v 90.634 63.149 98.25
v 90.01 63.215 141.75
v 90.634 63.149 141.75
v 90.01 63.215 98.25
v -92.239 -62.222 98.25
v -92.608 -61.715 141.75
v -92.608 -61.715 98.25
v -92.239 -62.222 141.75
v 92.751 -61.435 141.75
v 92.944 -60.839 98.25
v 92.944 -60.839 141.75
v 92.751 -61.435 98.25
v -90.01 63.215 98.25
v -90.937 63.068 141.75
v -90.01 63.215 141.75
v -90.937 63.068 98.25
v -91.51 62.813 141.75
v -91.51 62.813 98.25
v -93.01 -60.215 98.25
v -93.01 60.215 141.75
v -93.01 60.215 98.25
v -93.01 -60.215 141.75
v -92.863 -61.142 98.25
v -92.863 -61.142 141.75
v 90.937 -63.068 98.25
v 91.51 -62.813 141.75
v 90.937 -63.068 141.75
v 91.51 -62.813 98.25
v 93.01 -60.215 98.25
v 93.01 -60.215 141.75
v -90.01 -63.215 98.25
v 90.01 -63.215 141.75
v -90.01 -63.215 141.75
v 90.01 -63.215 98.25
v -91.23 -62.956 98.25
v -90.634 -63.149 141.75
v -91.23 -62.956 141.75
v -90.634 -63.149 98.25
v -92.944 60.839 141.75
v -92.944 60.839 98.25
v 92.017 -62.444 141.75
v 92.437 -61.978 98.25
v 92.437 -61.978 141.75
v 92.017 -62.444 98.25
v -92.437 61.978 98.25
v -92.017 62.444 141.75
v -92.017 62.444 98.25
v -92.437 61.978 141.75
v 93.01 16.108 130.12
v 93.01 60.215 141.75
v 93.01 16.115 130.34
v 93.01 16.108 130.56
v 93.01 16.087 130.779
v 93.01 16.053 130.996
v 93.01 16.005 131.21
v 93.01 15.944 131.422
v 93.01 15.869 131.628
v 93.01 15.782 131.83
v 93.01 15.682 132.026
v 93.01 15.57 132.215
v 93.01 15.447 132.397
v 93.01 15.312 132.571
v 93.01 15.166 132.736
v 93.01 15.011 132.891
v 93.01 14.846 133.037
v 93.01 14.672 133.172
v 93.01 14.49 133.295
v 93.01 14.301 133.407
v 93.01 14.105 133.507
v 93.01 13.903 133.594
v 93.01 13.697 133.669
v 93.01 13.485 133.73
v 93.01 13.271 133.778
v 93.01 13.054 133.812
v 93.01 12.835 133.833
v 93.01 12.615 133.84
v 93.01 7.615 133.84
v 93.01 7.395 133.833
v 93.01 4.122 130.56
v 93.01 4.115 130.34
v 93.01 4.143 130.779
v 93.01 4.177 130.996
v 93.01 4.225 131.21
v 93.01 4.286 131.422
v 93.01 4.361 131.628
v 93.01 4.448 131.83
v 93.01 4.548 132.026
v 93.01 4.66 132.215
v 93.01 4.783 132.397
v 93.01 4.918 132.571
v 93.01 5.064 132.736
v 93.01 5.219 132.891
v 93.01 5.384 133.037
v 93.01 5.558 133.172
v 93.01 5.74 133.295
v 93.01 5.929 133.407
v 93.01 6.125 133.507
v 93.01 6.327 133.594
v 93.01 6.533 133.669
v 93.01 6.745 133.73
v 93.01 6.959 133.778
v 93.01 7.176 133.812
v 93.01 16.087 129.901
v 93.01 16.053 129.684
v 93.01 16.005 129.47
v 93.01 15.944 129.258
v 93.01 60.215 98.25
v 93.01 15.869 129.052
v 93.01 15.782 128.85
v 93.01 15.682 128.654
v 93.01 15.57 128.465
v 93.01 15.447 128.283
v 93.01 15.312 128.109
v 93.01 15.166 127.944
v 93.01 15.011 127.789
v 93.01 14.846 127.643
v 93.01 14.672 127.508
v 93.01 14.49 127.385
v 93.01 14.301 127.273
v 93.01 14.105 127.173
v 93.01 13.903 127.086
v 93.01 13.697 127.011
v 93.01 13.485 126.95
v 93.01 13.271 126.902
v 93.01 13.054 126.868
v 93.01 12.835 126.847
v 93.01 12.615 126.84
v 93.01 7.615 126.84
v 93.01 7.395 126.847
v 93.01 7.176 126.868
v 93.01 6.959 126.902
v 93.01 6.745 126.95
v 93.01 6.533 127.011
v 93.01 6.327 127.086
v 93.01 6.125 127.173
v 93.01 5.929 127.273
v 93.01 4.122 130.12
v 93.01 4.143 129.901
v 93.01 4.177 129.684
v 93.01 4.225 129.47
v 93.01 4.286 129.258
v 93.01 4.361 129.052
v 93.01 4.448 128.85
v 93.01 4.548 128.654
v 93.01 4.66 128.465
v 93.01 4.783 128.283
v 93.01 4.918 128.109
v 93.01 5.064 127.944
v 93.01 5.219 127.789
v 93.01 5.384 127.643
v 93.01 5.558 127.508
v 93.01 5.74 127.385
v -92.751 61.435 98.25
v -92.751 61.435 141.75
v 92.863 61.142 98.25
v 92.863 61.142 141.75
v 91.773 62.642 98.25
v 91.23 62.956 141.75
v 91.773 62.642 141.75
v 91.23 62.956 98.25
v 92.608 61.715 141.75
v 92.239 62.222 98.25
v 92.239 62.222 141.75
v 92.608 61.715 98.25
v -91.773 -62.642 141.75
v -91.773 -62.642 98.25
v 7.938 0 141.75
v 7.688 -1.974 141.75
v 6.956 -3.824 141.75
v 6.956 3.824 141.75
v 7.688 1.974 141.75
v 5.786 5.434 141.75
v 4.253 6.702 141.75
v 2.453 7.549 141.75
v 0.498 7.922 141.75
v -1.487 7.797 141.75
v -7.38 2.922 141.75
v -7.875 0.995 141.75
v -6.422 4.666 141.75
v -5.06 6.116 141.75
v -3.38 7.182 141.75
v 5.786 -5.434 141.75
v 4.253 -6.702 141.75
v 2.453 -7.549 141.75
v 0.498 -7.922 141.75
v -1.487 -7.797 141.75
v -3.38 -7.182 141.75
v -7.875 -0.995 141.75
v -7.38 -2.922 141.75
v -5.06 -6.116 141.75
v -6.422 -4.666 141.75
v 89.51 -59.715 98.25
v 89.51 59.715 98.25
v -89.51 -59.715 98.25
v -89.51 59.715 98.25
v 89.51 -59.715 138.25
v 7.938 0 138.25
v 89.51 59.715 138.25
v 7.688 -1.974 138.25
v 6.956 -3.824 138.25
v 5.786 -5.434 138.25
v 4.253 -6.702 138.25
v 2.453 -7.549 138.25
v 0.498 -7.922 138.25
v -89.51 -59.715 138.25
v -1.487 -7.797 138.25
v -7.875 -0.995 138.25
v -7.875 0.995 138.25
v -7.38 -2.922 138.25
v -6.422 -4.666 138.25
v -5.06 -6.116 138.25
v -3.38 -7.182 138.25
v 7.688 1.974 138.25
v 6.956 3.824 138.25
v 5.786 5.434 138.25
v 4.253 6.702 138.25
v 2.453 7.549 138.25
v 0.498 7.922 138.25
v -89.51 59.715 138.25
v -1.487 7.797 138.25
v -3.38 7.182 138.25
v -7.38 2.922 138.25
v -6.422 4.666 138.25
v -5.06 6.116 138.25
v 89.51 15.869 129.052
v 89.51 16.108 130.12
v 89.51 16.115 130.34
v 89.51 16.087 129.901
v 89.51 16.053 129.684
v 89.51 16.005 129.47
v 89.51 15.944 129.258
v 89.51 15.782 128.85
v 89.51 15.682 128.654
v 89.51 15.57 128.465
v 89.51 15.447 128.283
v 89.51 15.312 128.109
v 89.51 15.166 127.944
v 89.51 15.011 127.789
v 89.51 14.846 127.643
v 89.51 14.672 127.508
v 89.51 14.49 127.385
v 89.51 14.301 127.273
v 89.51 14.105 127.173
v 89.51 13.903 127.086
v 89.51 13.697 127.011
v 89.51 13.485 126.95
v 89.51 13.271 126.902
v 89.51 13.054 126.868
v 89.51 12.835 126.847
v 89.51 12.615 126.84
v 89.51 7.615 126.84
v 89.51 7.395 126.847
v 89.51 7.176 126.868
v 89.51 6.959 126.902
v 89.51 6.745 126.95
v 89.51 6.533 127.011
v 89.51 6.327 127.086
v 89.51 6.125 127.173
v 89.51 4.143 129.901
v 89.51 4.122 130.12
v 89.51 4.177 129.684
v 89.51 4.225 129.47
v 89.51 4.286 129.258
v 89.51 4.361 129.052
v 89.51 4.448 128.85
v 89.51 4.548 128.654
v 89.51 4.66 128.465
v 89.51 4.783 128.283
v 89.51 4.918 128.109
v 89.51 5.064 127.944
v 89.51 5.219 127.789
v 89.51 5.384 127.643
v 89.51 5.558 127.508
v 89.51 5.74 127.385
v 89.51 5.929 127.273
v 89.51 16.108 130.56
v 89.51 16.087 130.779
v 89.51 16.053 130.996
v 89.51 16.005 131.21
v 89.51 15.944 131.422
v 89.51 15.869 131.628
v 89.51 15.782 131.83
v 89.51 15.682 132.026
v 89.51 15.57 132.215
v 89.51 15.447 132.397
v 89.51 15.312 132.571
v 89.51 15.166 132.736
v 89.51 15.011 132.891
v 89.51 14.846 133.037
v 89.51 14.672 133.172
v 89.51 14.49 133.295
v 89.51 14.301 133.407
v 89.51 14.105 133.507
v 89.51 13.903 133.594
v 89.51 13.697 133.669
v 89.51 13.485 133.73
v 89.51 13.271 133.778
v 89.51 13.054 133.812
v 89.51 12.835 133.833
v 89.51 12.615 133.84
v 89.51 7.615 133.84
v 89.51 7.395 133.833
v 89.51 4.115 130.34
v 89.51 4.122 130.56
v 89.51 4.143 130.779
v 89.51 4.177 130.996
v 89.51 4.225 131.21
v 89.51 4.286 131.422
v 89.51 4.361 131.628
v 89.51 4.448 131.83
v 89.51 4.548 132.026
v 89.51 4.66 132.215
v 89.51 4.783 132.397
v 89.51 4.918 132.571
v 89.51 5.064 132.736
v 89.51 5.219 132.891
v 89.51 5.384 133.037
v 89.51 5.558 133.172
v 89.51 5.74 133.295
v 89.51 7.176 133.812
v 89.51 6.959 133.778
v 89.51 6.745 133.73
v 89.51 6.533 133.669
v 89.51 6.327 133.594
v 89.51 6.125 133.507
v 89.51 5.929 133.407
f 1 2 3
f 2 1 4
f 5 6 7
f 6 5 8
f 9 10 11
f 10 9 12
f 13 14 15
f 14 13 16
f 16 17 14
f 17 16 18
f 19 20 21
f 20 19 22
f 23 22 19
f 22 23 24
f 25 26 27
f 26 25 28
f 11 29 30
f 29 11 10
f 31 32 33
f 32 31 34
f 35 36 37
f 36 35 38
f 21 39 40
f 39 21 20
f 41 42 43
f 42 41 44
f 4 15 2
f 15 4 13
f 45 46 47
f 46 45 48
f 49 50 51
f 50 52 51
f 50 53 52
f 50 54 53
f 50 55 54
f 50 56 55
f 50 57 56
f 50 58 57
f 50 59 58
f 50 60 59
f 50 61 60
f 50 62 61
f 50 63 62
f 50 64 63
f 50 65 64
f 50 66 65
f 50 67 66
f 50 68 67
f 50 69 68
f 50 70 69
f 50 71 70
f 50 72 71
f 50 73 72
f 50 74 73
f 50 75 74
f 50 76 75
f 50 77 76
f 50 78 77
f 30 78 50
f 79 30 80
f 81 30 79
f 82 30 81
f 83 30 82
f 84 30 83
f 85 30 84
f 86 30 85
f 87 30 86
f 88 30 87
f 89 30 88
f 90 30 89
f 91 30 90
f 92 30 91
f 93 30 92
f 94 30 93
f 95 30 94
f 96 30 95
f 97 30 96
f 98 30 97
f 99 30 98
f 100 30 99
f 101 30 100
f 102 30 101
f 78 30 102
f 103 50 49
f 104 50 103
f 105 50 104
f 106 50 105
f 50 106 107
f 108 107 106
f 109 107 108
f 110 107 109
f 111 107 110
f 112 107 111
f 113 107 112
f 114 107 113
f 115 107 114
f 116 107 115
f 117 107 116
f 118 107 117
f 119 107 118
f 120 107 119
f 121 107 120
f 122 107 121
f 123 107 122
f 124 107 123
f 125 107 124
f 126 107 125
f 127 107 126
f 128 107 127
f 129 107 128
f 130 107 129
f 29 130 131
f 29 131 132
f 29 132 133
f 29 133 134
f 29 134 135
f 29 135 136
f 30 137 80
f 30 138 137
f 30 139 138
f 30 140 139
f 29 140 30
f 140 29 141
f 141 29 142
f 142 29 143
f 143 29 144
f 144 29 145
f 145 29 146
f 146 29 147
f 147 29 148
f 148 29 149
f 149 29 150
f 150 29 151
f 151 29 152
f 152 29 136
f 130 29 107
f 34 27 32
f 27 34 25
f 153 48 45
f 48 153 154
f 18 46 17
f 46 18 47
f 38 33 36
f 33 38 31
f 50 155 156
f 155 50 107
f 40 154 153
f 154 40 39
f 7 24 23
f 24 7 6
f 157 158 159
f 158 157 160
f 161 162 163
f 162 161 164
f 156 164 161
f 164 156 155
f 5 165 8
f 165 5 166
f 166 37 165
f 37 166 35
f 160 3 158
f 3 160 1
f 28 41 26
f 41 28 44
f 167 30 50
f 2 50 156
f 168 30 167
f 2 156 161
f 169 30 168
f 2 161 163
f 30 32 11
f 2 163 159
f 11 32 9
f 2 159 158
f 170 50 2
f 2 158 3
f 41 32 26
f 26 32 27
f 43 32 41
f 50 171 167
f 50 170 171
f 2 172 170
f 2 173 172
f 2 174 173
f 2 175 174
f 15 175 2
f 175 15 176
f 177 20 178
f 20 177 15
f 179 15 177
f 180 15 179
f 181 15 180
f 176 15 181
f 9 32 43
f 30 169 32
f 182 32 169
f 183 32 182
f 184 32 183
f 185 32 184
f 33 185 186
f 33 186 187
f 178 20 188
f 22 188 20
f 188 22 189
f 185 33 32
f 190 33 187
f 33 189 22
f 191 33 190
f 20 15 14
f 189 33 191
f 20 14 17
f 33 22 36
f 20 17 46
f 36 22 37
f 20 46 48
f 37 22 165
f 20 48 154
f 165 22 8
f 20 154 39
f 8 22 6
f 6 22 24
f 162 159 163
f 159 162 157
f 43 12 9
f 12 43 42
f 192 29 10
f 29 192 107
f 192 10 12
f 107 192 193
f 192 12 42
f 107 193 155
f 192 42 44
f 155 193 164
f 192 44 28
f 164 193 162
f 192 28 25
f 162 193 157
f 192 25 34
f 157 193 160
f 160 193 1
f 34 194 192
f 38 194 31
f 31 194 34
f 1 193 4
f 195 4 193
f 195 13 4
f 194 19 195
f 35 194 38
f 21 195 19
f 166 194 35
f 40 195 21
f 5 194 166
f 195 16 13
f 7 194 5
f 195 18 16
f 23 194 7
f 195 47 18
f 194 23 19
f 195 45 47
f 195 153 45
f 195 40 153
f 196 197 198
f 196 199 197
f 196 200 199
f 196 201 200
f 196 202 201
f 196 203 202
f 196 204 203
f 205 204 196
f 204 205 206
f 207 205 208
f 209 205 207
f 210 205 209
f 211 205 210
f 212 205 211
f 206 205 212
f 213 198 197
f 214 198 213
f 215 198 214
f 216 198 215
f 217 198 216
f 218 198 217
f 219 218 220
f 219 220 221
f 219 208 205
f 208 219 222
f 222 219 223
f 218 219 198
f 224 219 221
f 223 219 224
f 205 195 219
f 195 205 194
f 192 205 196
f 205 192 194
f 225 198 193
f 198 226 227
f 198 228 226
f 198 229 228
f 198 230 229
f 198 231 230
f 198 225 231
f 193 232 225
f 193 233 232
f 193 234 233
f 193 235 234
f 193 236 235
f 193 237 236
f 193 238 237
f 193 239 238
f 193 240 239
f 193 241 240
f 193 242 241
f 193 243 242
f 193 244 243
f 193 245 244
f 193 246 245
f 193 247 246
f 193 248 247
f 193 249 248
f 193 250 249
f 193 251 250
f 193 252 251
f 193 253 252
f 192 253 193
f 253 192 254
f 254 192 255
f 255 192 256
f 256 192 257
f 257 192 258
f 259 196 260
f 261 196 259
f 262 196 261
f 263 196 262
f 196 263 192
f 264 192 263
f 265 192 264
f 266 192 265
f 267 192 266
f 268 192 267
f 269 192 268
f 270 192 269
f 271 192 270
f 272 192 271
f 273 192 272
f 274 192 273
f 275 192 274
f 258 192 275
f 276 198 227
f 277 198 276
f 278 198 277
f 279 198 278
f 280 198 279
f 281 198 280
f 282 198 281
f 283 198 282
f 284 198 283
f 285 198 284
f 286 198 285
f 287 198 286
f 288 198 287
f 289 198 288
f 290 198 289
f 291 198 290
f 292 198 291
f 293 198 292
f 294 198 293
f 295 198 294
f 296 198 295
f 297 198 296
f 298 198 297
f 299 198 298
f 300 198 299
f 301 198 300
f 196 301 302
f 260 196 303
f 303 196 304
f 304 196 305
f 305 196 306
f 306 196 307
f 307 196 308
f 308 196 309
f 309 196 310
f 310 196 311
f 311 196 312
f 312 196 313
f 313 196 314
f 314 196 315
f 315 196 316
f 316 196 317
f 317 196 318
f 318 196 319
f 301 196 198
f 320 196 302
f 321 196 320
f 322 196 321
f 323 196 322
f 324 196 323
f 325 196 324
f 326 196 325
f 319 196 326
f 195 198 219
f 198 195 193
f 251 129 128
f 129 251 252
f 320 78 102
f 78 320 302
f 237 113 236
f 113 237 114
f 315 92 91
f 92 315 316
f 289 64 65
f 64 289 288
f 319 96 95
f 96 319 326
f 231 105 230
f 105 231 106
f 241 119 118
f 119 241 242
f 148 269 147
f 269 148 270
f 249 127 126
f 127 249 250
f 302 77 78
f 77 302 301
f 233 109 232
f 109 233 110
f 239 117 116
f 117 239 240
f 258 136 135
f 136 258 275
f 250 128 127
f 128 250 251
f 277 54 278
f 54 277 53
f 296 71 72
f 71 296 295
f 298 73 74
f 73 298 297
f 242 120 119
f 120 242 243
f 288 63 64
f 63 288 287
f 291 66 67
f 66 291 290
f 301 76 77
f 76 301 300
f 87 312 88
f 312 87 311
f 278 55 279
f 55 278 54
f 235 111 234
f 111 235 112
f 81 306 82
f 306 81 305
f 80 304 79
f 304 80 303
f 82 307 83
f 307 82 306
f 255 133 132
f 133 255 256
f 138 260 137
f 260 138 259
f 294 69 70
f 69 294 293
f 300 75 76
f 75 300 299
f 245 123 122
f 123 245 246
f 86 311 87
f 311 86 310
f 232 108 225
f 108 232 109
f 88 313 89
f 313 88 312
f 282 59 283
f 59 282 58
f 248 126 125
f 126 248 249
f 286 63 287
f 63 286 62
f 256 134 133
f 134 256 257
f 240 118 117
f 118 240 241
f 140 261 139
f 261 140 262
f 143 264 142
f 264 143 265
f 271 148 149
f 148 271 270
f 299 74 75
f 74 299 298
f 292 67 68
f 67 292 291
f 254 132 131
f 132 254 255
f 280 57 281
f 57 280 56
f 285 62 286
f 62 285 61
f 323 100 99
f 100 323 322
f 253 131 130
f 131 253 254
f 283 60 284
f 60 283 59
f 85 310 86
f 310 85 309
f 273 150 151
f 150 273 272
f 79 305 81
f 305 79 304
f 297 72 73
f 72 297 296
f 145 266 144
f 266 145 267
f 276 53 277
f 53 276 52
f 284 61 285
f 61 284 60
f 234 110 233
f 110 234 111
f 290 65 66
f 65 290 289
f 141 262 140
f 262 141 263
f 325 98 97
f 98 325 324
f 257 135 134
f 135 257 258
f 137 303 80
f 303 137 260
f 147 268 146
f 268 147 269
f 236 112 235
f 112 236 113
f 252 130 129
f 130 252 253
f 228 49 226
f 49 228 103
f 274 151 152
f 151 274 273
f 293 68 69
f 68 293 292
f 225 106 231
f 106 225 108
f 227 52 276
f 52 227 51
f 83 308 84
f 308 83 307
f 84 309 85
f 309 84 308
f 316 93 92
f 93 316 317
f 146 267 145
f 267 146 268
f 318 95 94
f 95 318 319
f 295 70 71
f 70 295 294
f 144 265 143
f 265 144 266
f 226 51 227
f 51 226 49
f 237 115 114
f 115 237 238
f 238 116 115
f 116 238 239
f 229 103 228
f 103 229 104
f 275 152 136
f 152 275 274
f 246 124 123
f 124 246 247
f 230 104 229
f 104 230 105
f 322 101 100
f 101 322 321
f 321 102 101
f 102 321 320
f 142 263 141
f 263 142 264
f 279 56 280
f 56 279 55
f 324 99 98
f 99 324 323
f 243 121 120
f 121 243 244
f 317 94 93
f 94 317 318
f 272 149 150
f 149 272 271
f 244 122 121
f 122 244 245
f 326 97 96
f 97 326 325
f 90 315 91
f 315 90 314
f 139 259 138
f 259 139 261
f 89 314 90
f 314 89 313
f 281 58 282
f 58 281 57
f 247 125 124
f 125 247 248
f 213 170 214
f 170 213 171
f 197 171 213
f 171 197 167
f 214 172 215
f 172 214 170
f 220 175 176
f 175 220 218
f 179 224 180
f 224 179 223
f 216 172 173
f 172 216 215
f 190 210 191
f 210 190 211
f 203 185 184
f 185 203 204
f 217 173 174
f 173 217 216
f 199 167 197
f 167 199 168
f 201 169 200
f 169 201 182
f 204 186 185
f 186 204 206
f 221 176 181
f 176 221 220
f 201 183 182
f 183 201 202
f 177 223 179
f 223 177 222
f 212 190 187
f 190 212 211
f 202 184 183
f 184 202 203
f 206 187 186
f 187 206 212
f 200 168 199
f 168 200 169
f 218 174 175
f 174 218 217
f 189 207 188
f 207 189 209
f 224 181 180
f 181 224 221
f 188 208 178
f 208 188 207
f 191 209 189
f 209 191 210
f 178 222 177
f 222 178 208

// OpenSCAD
// file: usbA-C.scad
/* [Hidden] */

TWEAK = 1;

module make_USBA()
{
     DIA = 6 + TWEAK;
     WIDTH = 11.0 + TWEAK;
     DIST = WIDTH - DIA;
     LENGTH = 17.0;

     xDIA = 1.92 + TWEAK/2;
     xWIDTH = 7.0 + TWEAK/2;
     xDIST = WIDTH - DIA;
     xLENGTH = 5.68;

    translate([ 0, -xDIA, 0])  // "0" is where part sits ON a board
    {
         if ($preview)
         {
             color("PINK")
             translate( [-WIDTH , xDIA, 0])  // one face to sit 'on the board'
             rotate([90, 90, 0])
             cube( [WIDTH * 2, WIDTH * 2, 0.1], center = false);    // targeting plane
         }
         
         translate( [0, xDIA/2, 0])  // one face to sit 'on the board'
         {
             

             color("YELLOW", .3)
             hull()
             {
                 translate([ DIST /2, 0, 0 ])
                 cylinder(h = LENGTH, d = DIA, $fn=100);
                 
                 translate([ -DIST /2, 0, 0 ])
                 cylinder(h = LENGTH, d = DIA, $fn=100);
             }
             
             rotate([180, 0, 0])
             #hull()
             {
                 translate([ xDIST /2, 0, 0 ])
                 cylinder(h = xLENGTH, d = xDIA, $fn=100);
                 
                 translate([ -xDIST /2, 0, 0 ])
                 cylinder(h = xLENGTH, d = xDIA, $fn=100);
             }
         }
     }
}

module make_USBC()
{
     DIA = 6.10 + TWEAK;
     WIDTH = 10.9 + TWEAK;
     DIST = WIDTH - DIA;
     LENGTH = 14.0;

     xDIA = 2.54 + TWEAK/2;
     xWIDTH = 8.25 + TWEAK/2;
     xDIST = WIDTH - DIA;
     xLENGTH = 7.47;

     translate([ 0, -xDIA, 0])  // "0" is where part sits ON a board
     {
         if ($preview)
         {
             color("CYAN")
             translate( [-WIDTH , xDIA, 0])  // one face to sit 'on the board'
             rotate([90, 90, 0])
             cube( [WIDTH * 2, WIDTH * 2, 0.1], center = false);    // targeting plane
         }
         

         translate( [0, xDIA/2, 0])  // one face to sit 'on the board'
         {
             color("YELLOW", .3)
             hull()
             {
                 translate([ DIST /2, 0, 0 ])
                 cylinder(h = LENGTH, d = DIA, $fn=100);
                 
                 translate([ -DIST /2, 0, 0 ])
                 cylinder(h = LENGTH, d = DIA, $fn=100);
             }
             
             rotate([180, 0, 0])
             #hull()
             {
                 translate([ xDIST /2, 0, 0 ])
                 cylinder(h = xLENGTH, d = xDIA, $fn=100);
                 
                 translate([ -xDIST /2, 0, 0 ])
                 cylinder(h = xLENGTH, d = xDIA, $fn=100);
             }
        }
    }
}
translate([20, 0, 0])
make_USBA();
make_USBC();
// file: myTools.scad
module tube (r = 0, d = 0, l = 0, 
            thick = 0, 
            bCentered = true, 
            taper_pct = 0, 
            circlip = false) // r=radius d=dia l=length 
{
    assert( r != 0 || d != 0, "specify one of radius or diameter");
    assert( l != 0 , "tube: need length 'l' to be non zero");
    assert( thick != 0, "wall thickness cannot be zero");

    punch = $preview ? .2 : 0; // stop funny view artifact

    dia = r ? r * 2 : d;

    od = ((thick > 0) ? dia + thick * 2 : dia);
    id = (thick > 0) ? dia             : dia  + thick *2; 

    
    
    if (thick > 0)
        echo ("tube\tMIN id = ", id, "od = ", od, "wall = ", thick, "center= ", bCentered);
    else
        echo ("tube\tMAX od = ", od, "id = ", id, "wall = ", thick, "center= ", bCentered);

    echo ("tube\tHeigth = ", l);
        
    if (taper_pct != 0)
    {
        echo ("tube\t*** OD expanded by ", taper_pct, "%, : bottom od = ", od * (1. +taper_pct/100), "top od = ", od);
    }
    
    assert(dia || dia < 0, "tube : missing r or d ");
    
    // if taper_pct specified, the base will always be closest to 0,0,0
    translate([ 0, 0, taper_pct == 0 ? 0: bCentered ? l/2:l  ])
    rotate([0, taper_pct == 0 ? 0 : 180, 0 ])

    difference()
    {
        // make a reese's cup
        {
            color("YELLOW", .3)
            linear_extrude(height= l, scale = 1 + taper_pct/100)
                difference()
                {
                    circle(d = od);
                    circle(d = .5);
                }
        }
    
     // hollow out reessed cup
     color("GREEN")
     translate([0, 0, -punch/2])
     linear_extrude(height= l+ punch*2, $fn=100)
     {
        circle(d = id);
        if (circlip) #square([1 + punch, od ]);
     }
    
    }
}
//==============================================================================
        
module abox (dims, 
            thick = 0, 
            bCentered = true, 
            round_out = 0, 
            round_in = 0, 
            bSolid = false,
            bHollow = false,
            elevator = 0)   // move bottom up by X
{
    punch = $preview ? .1 : 0; // stop funny view artifact
    
    assert(thick != 0, "Thick must be specified. +=outside dim, -= inside dims");
    assert(dims.z > thick, "wall thickness too large for depth of box");

    wall2 = abs(thick) * 2; // 2 walls in each direction
    wall = wall2 / 2;
    
    // box either grows inward (thick < 0) or outward (thick > 0)  from dims
    fat = dims + [ wall2, wall2, wall];
    thin = dims - [ wall2, wall2, wall];
    
    offset = (thick > 0 && bCentered == false) ? wall : 0;
    
    //echo ("abox : adjusting x,y,z by ", offset, " to move origin from  center to 0,0,0");
    translate( [ bCentered ? 0 : dims.x /2 + offset, bCentered ? 0 : dims.y /2 + offset, bCentered ? 0 : dims.z /2 + offset/2]) 
    {
        if (thick > 0)
        {   
            // wall grows outwards from users dim
            echo ("making a box, MAX INSIDE dim = ", dims, "a wall=", thick, "mm ... max outside = ", fat, " mm");
        }
        else
        {
            // wall grows inward from users dime
            echo ("making a box, MAX OUTSIDE dim = ", dims, "a wall=", thick, "mm ... min inside = ", thin, " mm");
        }
        
        // linear extrude alway works in the positive x/y plane an goes upward.
        // after calc, re-center about 0,0,0 where a bCentered cube would be
        
        translate([ 0, 0, thick > 0  ? -fat.z/2 : -dims.z/2 ])
        difference()
        {
            echo ("round_out = ", round_out);

            // MAKE SOLID BOX --------------------------------------
            router_outside = round_out ? round_out : 0;
            x = thick > 0  ? fat.x - router_outside : dims.x - router_outside;
            y = thick > 0  ? fat.y - router_outside : dims.y - router_outside;


            // MAKE PUCHNED INSIDE
            // using 'offset' it will add r on all dimensions, then round., 
            // so now you have fatter perimeter than you started with :(
            //  but at least the corners are round.
            
            // Compensate by shrinking dimension by r, 
            // and then by calling offset, offset will then add it back

            color("YELLOW", .2)

            linear_extrude(thick > 0  ? fat.z : dims.z)
            if (round_out)
            {
                offset( r= round_out, $fn=30)
                square( [x - router_outside, y - router_outside], true);
            }
            else square( [x - router_outside, y - router_outside], true);
           
            // time to punch out the inside if requested.
            if (bSolid == false)
            {
                hollow_offset = bHollow ? fat.z/2 + .2  : dims.z/2 +.2;
                // punching out inside. its either dims or thin.
                router_inside = round_in;
                echo ("round_in = ", router_inside);
                xi = thick > 0  ? dims.x  : thin.x;
                yi = thick > 0  ? dims.y : thin.y ;

                color("GREEN")

                // move 'punch' up if you need a bottom else zero (hollowed out)

                translate([ 0,0, bHollow ? -.1 : wall + elevator]) 
                linear_extrude(thick > 0  ? fat.z - wall  + hollow_offset : dims.z - wall + hollow_offset)
                //#linear_extrude(fat.z - wall  + hollow_offset)
                
                if (round_in) 
                {
                    offset( r= round_in, $fn=30)
                    square( [ xi - router_inside, yi - router_inside], true);
                }
                else
                    square( [ xi, yi], true);
            }
        }
    }
 }


// 50x25x10 box walls grow inward (-2). on center origin midpoint
// rounded outside (default), sharp corner inside(default), bCentered about 0,0,0
//color("GREEN", .9)
//abox([50,25, 10], -2, true); 


// 50x25x10 box walls grow inward (-2). on center origin midpoint
// sharp outside corners, rounded inside corners. Sit on x,y plane
color("BLUE", .9)
abox([50,20, 10], +2, round_in=2, bCentered = false);  // 50x25x10 box inside dim origin has 0,0


// 50x25x10 box walls grow inward (-2). on center origin midpoint
// sharp corners inside and out. sits on x,y plane
color("GREY", .9)//
translate([ 55, 0, 0])      
abox([50,20, 10], +2, round_out=3, false);

color("PINK", .9)//
translate([ 115, 10, 10])      
abox([86.66, 56.865, 5], -5, bHollow = true, bCentered = false); 

color("GREEN", .9)//
translate([ 140, 10, -10])      
abox([86.66, 56.865, 5], 3, bHollow = true, bCentered = false); 

/*
// 50x25x10 box walls grow inward (-2). on center origin midpoint
// round corners outside and SOLID
color("BLUE", .9)//
translate([ 55, 0, 0])      
abox([50,25, 10], +2, round_out=2, round_in=0, false, bSolid = true); // 50x25x10 box outside dim origin is 0,0
*/

//translate ([-30,-30, 0])
{
/*
    // tube outer dia  20, inner dia = (20 - 8)
    color("PINK")
    tube (d = 20, l = 20, thick = -8, bCentered = false);

    // tube, inner dia = (2* 10), outer dia = ((2*10) + 2) 
    color("PURPLE", .3)
    tube (r = 10, l = 20, thick = +2, bCentered= true);
*/
/*
    tube (d = 60, l = 20, thick = -6, bCentered = false);

    translate([0, 0, 50])
    tube (d = 60, l = 20, thick = -6, bCentered = false, taper_pct = 20, circlip = true);
    //color("GREEN")
    //tube (d = 20, l = 20, thick = -2, bCentered = false, taper = 10, circlip = true);
*/

}
// main file
use <myTools.scad>
use <usbA-C.scad>

MM=25.43;


bMakeFrame = false; //true;
bMakeBottom = false; //true;
bMakeBackSide = true; //true;

inside_length = 6 * MM + 17.49 + 1.25;
inside_width = 111.23 + .5 ;
outside_height = 5;
BEZEL_THICK = 3.5;


flex_cable_wide = inside_length - 2 * 74 ;
flex_cable_offset = inside_length - 74;
MYLAR_FEED = [flex_cable_wide, 2, 9 ];


if (bMakeBottom)
{
    difference()
    {
        // don't need box to have max emptyness, raise floor via elevator = 3
        abox([inside_length, inside_width, outside_height], thick = +BEZEL_THICK, elevator = 2);

        translate([ -MYLAR_FEED.x/2,  
                    inside_width/2 - BEZEL_THICK + MYLAR_FEED.y/2 + 2 ,
                    -MYLAR_FEED.z * 3/4 + .5 ])
        color("RED")
        cube(MYLAR_FEED , center = false);
        

    }
}
//----------------------------------------------------------------------------------------

if (bMakeFrame)
{
    //
    //  MAKE HOLD DOWN FRAME

    LCD_WHITE_BOARDER = 1.6 + .5;
    NOTCH = .86;

    translate([ 0,0,50])
    union()
    {
        // don't need box to have max emptyness, raise floor via elevator = 3
        color("CYAN")
        abox([inside_length, inside_width, outside_height], thick = +BEZEL_THICK, bHollow = true, bCentered = true);

        // make small ridge .7mm high on the inside of the frame above
        translate([0, 0 , .7/2])
        color("PURPLE")
        abox([inside_length, inside_width, outside_height * 2 - .7 ],
                thick = -(LCD_WHITE_BOARDER),
                bHollow = true, bCentered=true);

        // hide white frame of display
        // don't need box to have max emptyness, raise floor via elevator = 3
        color("BLUE")
        translate([0, -inside_width/2 + BEZEL_THICK , 0])
        abox([inside_length, LCD_WHITE_BOARDER, outside_height], thick = +BEZEL_THICK, bSolid = true, bCentered = true);


    }
}


box_height = 40;

if (bMakeBackSide)
{

    translate([ 0,0, 120])
    {
        difference()
        {
            color("GREEN", .5)
            rotate([-180, 0, 0])
            {
                abox([inside_length + BEZEL_THICK *2 + .7, 
                      inside_width + BEZEL_THICK *2 + .7, 
                      box_height], 
                      thick = +BEZEL_THICK, 
                      bHollow = false, bCentered = true, round_out=3);
            }
            
            translate([0,0, -box_height/2 +2])
            #cylinder(h = box_height, d= 25.4 * 5 /8);
            
            // position usb from the center line, not from a wall.
            translate([ (inside_length + BEZEL_THICK *3)/2 -2, 
                        (inside_width + BEZEL_THICK *3)/2 - 51, 
                         box_height/2 - 33.8/4])
            rotate([ 90, 0, 90])
            #make_USBA();
        }
    }
}
